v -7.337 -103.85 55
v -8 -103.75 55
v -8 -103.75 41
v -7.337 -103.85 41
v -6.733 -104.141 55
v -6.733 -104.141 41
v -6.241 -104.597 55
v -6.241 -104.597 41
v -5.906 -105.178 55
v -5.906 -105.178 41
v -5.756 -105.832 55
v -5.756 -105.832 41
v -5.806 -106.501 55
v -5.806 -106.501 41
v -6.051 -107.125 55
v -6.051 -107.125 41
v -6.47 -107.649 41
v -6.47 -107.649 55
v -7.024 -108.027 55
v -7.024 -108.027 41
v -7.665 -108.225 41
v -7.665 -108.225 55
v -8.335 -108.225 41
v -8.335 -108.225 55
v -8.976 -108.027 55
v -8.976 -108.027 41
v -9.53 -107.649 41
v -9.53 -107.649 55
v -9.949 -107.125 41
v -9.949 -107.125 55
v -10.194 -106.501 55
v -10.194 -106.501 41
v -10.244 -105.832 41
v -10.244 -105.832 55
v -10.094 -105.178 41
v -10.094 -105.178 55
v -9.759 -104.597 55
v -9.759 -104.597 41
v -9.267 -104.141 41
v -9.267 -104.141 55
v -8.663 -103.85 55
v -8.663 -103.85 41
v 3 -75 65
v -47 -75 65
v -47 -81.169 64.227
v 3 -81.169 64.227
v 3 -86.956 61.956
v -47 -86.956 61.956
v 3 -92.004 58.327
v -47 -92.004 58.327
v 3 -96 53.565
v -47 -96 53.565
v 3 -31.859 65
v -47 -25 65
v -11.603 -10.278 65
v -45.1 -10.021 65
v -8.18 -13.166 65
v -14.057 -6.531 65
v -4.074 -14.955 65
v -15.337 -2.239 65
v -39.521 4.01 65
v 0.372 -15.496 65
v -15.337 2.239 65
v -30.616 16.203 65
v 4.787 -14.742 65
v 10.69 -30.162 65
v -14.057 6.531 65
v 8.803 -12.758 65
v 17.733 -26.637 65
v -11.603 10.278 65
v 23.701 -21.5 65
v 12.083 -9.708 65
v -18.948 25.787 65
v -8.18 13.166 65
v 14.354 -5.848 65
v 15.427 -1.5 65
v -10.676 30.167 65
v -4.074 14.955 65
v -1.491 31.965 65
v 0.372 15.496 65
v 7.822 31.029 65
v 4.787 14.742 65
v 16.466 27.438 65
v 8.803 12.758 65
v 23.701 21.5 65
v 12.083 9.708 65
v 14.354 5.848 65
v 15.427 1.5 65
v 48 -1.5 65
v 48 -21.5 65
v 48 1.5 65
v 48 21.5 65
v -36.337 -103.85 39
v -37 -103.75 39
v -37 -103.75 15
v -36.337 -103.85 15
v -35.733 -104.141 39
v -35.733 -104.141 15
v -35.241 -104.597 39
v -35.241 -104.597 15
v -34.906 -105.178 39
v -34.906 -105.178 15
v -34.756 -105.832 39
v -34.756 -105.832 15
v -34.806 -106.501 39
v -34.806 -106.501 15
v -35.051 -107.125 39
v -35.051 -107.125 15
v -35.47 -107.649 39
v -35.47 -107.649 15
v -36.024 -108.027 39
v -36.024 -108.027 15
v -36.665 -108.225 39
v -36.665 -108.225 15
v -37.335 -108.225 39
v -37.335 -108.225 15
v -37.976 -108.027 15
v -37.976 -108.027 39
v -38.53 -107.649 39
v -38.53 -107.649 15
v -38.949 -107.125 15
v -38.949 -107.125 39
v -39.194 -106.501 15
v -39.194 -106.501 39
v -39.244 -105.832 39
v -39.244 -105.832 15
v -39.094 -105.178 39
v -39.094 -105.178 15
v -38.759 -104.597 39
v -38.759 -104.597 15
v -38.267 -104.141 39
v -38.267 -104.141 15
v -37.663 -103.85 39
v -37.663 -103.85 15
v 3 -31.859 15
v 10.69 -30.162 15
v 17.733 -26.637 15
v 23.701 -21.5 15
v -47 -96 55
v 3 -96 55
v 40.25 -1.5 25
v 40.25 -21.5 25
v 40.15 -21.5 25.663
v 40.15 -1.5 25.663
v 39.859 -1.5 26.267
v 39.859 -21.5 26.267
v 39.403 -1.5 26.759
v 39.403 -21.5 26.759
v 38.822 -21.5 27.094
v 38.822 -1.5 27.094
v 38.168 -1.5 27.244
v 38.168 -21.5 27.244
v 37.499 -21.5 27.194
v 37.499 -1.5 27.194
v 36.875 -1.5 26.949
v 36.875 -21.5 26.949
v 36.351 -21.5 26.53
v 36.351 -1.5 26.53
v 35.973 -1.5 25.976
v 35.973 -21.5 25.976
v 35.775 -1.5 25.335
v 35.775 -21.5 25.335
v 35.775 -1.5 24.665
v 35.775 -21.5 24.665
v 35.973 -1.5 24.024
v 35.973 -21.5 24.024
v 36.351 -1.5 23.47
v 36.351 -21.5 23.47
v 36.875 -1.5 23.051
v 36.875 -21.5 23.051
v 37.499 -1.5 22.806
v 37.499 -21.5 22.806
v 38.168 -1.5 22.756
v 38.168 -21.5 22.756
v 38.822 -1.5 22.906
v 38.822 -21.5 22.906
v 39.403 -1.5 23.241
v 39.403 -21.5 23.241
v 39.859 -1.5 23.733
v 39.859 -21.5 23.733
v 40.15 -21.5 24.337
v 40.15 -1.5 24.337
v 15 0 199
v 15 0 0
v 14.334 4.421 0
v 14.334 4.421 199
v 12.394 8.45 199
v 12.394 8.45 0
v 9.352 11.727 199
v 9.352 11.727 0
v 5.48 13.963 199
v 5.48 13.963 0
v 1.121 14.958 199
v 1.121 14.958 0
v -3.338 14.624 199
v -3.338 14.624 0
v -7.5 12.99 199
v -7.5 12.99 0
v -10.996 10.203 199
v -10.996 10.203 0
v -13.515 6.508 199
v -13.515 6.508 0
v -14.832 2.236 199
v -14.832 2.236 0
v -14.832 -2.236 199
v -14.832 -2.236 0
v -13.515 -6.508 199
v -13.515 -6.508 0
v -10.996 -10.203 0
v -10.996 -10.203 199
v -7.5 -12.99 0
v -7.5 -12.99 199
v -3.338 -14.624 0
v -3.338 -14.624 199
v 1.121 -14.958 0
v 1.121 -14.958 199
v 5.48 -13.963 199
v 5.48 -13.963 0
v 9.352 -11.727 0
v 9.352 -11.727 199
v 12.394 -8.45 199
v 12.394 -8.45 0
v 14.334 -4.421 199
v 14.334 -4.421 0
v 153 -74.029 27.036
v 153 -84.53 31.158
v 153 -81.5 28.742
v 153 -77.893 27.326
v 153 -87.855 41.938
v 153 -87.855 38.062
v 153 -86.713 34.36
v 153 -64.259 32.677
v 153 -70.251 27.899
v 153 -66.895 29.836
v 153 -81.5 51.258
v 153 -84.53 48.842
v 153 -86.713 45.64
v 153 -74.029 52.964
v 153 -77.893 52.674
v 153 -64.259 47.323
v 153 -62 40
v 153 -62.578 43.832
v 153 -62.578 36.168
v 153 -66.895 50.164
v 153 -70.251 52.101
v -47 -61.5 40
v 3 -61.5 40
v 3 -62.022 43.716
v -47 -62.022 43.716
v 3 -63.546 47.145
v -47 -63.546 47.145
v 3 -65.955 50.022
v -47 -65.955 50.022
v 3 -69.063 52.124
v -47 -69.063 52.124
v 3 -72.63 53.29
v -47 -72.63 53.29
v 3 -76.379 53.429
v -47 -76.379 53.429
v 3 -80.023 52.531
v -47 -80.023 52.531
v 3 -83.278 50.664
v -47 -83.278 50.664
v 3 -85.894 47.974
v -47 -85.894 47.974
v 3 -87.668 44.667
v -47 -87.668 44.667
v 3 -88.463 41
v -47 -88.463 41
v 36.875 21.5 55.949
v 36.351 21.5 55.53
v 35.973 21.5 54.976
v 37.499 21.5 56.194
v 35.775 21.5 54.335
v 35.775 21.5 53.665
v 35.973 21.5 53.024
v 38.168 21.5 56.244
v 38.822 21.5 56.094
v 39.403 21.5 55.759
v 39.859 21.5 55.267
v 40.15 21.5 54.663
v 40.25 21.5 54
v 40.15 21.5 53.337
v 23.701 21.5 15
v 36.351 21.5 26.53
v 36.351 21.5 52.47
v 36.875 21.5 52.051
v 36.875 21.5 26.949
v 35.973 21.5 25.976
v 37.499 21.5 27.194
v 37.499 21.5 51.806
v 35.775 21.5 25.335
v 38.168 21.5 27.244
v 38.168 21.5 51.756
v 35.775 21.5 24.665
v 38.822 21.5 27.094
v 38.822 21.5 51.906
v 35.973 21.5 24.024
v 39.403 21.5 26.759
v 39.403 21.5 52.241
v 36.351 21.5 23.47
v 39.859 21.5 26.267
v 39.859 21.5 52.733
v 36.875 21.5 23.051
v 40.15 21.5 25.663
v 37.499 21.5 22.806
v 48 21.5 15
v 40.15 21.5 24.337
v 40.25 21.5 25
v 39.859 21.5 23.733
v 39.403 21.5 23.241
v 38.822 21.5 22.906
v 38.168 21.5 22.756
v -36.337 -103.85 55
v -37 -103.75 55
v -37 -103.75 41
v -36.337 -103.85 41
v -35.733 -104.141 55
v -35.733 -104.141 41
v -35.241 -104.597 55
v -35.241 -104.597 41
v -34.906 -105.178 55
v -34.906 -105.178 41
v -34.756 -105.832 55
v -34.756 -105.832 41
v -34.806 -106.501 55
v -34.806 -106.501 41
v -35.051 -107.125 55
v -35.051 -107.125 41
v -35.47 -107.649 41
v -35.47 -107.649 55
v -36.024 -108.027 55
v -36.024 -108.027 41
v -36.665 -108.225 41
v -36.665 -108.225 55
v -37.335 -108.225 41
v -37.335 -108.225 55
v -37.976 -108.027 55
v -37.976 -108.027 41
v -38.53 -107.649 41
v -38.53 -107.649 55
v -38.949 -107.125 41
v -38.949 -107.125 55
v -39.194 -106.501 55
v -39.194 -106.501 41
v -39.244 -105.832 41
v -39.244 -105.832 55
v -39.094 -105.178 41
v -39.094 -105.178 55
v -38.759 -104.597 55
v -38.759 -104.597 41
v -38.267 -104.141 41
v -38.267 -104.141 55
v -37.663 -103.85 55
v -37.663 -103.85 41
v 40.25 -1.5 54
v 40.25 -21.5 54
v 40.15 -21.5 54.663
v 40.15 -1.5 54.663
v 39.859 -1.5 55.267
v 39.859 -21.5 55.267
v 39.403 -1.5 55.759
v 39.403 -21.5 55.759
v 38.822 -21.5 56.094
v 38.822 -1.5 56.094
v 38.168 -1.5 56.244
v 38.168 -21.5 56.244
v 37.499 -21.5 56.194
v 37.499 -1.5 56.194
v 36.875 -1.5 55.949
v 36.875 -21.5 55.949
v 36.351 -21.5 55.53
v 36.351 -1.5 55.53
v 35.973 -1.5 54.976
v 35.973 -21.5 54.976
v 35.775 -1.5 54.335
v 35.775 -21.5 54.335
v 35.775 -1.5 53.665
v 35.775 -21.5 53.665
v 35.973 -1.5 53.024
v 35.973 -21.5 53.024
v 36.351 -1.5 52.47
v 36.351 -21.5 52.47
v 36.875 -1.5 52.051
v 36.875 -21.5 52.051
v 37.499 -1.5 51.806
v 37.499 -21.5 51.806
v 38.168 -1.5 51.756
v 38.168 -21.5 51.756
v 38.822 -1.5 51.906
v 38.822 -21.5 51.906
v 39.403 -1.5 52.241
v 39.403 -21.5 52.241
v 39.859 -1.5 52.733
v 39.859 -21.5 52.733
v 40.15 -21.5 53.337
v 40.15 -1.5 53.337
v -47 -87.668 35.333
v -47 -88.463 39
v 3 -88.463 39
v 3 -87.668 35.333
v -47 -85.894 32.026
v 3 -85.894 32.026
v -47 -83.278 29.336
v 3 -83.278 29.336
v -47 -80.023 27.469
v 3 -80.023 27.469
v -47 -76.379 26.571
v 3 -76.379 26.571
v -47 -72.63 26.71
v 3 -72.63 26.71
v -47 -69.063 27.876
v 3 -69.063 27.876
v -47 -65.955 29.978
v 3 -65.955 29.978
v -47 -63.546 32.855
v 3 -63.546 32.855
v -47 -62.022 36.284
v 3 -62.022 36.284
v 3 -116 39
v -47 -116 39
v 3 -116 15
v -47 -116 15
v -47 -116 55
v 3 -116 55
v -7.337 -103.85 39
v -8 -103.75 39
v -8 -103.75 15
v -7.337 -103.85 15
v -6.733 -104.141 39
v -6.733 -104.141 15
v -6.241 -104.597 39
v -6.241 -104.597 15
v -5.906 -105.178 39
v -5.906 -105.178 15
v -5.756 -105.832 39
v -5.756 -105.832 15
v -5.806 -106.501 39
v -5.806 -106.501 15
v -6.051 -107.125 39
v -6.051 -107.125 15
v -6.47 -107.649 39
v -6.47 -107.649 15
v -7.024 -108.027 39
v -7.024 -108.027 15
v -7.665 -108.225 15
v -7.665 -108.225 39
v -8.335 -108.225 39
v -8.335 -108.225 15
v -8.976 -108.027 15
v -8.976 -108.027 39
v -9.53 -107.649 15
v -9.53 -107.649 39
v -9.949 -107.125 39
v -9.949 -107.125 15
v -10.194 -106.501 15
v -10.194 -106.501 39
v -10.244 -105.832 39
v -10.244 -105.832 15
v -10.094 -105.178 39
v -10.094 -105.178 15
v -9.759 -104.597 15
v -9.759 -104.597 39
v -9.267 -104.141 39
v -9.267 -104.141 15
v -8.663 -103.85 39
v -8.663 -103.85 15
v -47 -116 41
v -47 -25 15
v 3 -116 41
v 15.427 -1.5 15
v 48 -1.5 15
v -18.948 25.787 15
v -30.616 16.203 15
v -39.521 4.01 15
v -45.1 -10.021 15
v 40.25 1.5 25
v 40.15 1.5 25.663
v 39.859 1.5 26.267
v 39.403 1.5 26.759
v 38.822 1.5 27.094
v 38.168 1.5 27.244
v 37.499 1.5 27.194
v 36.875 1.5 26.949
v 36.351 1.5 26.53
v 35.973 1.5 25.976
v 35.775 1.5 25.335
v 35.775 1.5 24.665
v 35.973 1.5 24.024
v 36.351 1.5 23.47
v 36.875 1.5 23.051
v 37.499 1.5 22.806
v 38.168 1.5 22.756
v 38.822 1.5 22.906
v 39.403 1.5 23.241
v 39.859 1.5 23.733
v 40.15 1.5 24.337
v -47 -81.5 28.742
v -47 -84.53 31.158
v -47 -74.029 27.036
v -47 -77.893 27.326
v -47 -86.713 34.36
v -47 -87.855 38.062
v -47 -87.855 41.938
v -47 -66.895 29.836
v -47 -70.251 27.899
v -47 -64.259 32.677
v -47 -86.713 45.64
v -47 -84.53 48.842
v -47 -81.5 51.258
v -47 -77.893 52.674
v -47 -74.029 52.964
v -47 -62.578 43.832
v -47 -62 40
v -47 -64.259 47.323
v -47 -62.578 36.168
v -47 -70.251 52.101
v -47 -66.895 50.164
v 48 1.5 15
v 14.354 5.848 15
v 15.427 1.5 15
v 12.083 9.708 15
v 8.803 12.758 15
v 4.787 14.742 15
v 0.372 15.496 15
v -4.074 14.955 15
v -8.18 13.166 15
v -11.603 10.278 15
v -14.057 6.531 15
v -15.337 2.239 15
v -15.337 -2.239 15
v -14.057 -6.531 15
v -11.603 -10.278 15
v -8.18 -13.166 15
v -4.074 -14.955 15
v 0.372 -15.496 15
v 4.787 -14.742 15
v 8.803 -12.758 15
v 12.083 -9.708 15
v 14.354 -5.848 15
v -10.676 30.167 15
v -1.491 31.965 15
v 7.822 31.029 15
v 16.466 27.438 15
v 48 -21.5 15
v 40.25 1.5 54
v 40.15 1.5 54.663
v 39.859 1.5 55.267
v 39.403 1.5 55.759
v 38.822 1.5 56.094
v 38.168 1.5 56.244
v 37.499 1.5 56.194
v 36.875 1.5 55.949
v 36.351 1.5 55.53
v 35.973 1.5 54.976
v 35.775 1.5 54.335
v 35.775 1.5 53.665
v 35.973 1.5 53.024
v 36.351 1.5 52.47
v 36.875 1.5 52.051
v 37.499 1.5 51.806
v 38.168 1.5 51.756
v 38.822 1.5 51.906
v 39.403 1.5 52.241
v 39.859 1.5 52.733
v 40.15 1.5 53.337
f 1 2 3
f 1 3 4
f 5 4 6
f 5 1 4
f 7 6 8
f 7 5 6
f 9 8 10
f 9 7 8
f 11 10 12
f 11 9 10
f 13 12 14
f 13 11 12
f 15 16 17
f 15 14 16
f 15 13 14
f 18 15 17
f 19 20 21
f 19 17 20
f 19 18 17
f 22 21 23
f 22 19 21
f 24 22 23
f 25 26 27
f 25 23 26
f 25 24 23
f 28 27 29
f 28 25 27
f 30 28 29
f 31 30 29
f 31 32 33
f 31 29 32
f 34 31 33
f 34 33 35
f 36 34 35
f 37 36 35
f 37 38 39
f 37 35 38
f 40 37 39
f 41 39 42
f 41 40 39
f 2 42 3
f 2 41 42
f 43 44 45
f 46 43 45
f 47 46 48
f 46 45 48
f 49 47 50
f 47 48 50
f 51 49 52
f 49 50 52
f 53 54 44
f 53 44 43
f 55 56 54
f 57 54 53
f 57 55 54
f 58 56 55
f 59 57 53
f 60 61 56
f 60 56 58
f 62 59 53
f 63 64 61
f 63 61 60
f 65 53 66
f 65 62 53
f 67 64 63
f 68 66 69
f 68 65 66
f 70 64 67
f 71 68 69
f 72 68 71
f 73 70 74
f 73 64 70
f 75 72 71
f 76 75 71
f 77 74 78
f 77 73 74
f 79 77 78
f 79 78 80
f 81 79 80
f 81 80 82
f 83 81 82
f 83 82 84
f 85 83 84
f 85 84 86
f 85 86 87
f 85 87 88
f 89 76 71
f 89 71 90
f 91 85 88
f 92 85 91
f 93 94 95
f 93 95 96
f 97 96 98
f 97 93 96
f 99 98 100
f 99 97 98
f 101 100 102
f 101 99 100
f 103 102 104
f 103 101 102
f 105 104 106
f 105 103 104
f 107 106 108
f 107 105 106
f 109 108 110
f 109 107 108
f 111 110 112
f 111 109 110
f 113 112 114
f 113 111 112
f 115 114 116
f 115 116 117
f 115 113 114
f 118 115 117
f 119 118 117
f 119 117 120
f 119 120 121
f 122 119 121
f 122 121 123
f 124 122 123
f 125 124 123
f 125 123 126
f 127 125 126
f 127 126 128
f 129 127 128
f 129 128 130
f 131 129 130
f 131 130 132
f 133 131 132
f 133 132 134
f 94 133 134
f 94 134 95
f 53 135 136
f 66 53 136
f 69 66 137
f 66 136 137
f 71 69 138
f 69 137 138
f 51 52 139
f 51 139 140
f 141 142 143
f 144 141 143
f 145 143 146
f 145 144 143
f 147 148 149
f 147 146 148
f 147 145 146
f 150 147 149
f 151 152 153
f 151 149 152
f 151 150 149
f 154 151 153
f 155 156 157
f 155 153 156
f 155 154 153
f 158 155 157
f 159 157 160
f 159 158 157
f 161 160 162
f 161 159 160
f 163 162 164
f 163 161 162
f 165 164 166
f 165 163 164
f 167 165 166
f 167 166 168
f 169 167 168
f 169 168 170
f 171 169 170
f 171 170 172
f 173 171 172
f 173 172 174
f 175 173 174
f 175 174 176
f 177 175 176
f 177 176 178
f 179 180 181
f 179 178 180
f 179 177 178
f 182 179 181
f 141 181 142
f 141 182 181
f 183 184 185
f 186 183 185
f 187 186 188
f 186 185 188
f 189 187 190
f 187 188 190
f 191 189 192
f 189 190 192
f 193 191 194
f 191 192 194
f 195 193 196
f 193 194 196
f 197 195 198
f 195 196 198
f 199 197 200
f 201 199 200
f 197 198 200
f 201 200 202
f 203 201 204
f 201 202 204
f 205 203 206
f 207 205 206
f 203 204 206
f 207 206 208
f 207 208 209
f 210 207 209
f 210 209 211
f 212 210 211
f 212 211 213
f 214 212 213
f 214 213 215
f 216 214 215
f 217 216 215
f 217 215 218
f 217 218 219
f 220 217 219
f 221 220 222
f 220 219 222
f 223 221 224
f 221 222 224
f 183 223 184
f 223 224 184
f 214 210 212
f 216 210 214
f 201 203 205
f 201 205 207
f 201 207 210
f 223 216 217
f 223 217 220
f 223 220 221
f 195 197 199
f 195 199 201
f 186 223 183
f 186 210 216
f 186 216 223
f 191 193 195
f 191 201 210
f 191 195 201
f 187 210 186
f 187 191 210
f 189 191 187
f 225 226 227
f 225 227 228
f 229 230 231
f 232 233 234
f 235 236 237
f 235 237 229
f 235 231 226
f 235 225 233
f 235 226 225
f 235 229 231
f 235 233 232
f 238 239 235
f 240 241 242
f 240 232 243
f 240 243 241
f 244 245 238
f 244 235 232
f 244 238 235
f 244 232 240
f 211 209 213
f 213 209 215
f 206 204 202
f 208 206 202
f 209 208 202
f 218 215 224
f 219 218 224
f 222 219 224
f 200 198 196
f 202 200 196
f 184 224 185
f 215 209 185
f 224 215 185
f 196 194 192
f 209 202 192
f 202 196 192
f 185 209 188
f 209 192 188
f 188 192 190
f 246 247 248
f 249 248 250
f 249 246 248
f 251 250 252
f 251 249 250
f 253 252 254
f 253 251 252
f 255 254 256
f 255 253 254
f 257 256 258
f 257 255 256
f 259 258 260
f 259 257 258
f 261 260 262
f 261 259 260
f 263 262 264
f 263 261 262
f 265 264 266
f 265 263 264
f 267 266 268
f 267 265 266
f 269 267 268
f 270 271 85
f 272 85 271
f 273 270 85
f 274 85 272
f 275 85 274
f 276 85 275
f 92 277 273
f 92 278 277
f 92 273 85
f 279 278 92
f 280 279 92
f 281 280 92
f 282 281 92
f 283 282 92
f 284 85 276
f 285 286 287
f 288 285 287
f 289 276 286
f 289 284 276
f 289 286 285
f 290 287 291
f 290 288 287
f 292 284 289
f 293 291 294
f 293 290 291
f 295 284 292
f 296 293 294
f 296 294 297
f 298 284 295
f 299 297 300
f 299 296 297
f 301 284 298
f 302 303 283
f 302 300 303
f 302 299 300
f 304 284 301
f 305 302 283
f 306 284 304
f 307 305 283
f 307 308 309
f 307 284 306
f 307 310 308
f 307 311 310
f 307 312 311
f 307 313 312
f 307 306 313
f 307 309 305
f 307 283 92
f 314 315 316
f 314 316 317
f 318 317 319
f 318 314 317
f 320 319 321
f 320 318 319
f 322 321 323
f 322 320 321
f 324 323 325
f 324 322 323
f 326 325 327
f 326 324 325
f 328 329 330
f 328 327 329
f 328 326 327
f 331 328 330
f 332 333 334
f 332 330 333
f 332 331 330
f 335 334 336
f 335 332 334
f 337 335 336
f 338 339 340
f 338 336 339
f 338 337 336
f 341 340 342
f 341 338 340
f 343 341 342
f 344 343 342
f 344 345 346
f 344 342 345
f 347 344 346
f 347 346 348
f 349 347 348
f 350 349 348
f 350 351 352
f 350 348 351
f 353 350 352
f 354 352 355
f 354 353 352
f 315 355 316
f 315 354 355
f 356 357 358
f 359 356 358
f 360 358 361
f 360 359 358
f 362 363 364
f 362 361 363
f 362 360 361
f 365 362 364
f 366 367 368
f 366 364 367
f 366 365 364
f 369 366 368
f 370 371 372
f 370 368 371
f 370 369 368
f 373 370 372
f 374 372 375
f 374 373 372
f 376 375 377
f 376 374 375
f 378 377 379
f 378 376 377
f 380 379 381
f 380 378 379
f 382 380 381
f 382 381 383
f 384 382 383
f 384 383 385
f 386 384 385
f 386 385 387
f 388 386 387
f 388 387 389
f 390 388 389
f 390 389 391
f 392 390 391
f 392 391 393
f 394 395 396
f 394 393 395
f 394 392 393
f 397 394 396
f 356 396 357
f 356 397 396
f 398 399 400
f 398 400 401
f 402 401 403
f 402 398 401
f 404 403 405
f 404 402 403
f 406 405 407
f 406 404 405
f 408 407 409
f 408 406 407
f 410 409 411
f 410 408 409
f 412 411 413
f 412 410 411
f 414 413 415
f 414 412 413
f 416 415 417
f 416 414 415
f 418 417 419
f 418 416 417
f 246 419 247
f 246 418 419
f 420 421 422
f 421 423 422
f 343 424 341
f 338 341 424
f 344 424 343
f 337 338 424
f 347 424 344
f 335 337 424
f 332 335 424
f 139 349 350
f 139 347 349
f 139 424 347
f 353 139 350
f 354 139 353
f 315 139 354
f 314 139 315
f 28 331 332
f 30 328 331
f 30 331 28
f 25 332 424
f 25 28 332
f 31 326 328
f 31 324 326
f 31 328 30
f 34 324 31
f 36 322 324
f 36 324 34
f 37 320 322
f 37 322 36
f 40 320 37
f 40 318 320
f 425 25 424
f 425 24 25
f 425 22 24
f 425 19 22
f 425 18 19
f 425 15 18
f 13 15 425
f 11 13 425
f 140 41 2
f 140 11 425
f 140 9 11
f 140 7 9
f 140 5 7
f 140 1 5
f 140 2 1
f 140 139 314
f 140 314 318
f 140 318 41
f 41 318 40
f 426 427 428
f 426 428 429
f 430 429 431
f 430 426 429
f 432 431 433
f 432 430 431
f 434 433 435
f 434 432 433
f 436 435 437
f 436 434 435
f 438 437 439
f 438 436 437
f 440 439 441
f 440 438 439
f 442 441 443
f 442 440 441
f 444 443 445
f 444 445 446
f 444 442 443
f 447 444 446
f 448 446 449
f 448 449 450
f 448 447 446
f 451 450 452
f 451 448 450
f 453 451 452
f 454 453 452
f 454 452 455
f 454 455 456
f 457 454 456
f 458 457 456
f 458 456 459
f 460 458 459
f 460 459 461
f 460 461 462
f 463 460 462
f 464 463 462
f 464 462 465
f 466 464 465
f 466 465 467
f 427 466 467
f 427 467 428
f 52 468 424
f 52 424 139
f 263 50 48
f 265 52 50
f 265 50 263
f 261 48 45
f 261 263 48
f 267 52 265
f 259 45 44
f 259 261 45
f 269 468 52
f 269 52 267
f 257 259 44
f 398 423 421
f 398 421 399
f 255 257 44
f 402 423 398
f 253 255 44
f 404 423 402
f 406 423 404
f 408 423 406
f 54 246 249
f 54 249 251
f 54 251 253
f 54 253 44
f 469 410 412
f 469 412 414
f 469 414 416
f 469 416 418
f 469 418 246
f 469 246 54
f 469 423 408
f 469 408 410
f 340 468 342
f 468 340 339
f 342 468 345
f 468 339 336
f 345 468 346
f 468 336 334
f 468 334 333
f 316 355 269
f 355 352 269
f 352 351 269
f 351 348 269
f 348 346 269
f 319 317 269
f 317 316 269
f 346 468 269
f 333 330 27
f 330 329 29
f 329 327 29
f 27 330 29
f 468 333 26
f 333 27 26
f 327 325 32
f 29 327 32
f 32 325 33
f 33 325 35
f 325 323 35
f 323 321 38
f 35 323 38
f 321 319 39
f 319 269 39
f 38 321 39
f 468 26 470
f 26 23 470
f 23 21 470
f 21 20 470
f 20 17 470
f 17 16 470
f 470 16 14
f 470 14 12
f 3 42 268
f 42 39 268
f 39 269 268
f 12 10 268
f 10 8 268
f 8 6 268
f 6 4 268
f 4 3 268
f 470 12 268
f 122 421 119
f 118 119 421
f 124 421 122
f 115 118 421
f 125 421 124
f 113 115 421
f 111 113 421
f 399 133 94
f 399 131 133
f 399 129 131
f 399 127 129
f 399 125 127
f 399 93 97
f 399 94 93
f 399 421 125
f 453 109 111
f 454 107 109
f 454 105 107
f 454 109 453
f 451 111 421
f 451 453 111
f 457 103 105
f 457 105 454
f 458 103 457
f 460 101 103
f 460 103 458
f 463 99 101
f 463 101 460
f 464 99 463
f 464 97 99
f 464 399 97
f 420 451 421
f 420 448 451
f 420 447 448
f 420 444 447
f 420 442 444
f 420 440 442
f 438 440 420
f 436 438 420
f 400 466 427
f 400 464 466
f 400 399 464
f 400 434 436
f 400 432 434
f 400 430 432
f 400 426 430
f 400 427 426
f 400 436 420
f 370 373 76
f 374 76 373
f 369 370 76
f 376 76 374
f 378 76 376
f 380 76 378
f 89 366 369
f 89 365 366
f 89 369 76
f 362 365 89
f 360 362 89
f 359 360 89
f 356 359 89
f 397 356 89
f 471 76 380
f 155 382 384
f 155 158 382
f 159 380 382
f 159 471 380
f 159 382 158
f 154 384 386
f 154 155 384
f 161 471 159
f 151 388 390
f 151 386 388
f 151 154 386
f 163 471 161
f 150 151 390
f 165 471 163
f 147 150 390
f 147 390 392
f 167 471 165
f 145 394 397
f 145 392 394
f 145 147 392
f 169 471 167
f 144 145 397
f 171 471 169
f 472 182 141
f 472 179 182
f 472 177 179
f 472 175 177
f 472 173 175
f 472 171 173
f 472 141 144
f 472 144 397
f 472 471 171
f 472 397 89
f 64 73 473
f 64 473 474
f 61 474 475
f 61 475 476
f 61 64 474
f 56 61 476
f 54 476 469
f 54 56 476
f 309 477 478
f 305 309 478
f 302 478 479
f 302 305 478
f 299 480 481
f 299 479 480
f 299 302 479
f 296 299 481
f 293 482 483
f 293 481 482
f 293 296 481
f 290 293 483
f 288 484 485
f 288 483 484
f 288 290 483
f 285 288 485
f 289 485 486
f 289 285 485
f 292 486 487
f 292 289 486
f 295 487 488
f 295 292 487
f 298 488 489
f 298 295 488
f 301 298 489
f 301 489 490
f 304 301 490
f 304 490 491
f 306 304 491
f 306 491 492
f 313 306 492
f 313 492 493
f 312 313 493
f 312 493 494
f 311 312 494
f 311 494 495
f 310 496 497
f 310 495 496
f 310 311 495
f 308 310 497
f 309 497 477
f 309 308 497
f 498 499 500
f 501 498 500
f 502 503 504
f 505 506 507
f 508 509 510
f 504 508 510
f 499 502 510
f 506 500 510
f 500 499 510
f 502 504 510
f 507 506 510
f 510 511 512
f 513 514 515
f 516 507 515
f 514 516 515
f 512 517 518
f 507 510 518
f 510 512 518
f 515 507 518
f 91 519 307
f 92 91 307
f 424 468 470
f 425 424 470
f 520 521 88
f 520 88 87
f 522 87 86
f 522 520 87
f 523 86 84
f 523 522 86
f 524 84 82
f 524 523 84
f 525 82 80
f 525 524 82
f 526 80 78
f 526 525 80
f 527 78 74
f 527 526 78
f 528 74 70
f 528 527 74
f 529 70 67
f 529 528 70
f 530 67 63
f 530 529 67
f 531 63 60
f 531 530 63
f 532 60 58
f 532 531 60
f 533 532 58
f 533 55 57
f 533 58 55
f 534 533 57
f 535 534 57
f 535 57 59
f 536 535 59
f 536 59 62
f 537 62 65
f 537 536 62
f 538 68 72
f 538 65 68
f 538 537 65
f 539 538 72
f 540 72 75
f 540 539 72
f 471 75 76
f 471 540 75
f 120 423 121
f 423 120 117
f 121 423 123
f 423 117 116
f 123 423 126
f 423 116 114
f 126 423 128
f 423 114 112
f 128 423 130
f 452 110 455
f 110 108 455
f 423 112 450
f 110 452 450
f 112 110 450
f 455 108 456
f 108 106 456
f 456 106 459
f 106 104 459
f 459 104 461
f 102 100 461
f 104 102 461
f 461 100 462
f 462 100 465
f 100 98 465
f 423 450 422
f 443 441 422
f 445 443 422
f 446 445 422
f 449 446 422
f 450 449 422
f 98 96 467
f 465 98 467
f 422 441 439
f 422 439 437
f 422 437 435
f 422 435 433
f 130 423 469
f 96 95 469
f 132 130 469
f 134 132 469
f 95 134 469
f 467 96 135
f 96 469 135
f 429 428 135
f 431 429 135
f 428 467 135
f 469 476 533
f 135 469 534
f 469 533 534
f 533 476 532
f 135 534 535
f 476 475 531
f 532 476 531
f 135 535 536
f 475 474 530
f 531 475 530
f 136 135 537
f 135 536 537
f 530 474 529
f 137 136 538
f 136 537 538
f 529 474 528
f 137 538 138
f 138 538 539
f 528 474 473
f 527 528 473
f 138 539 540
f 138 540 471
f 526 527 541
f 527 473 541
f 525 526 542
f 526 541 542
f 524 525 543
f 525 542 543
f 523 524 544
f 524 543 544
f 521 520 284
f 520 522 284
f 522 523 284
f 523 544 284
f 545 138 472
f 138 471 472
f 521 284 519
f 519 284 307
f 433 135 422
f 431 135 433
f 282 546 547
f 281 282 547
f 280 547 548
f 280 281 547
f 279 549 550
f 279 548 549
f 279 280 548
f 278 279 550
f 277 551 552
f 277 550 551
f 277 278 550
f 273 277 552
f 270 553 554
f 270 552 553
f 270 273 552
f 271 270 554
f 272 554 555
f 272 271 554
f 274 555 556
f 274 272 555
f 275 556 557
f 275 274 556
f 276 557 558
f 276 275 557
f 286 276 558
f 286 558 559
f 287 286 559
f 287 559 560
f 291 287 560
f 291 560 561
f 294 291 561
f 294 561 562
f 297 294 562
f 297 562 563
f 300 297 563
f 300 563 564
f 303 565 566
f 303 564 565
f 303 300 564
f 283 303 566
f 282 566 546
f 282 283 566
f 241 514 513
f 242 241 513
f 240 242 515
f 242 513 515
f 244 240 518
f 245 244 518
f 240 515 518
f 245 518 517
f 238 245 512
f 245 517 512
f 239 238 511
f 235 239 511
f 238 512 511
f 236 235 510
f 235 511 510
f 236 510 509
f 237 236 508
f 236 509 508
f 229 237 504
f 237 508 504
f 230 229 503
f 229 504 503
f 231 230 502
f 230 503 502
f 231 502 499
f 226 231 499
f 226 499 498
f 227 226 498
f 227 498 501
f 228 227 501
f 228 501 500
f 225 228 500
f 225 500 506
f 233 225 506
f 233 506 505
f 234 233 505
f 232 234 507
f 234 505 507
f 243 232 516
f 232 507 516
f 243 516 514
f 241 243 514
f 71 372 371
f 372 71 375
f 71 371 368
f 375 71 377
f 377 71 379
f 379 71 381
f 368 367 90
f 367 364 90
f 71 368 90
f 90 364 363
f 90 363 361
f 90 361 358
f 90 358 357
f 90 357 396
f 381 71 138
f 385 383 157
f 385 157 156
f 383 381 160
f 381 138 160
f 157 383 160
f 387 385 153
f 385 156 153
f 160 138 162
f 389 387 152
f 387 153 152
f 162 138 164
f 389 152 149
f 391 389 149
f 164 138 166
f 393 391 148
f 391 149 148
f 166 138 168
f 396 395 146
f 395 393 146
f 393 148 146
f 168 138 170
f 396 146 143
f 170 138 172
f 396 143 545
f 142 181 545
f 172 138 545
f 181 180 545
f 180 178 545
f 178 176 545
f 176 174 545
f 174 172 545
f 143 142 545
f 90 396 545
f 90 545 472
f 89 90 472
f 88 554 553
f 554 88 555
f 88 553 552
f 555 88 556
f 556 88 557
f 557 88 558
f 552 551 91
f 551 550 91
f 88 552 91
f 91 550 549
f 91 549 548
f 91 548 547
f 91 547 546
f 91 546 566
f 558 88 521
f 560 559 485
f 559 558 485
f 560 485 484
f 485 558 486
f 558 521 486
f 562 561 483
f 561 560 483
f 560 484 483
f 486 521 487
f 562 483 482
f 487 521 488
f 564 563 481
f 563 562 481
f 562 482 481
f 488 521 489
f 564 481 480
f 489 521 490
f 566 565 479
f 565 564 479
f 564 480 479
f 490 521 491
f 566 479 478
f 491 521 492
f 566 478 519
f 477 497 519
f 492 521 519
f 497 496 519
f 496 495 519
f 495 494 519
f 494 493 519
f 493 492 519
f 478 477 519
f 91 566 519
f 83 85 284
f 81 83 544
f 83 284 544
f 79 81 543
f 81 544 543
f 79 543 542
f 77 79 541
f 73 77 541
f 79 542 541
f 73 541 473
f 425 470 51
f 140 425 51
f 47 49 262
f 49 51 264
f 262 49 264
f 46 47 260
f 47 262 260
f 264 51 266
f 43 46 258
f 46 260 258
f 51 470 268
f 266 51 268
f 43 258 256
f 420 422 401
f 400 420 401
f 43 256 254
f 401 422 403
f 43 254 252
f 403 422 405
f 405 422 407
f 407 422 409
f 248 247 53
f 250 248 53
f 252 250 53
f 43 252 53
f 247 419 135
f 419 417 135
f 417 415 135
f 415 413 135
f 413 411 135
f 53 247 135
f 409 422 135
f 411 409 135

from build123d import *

# Parameters (mm, degrees)
CYLINDER_R                  = 15
CYLINDER_DEPTH              = 199
CYLINDER001_R               = 13
CYLINDER001_DEPTH           = 200
CYLINDER005_R               = 2.25
CYLINDER005_DEPTH           = 50
CYLINDER006_R               = 2.25
CYLINDER006_DEPTH           = 50
FUSION_ROLL_ANGLE           = 90
FUSION_PLACEMENT_ANGLE      = 90
CYLINDER004_R               = 15.5
CYLINDER004_DEPTH           = 199
CYLINDER003_R               = 13.5
CYLINDER003_DEPTH           = 200
BOX_W                       = 20
BOX_H                       = 3
BOX_DEPTH                   = 50
BOX006_W                    = 50
BOX006_H                    = 27
BOX006_DEPTH                = 2
CYLINDER007_R               = 2.25
CYLINDER007_DEPTH           = 50
CYLINDER008_R               = 2.25
CYLINDER008_DEPTH           = 50
BOX001_W                    = 25
BOX001_H                    = 20
BOX001_DEPTH                = 50
BOX002_W                    = 25
BOX002_H                    = 20
BOX002_DEPTH                = 50
BOX003_W                    = 50
BOX003_H                    = 75
BOX003_DEPTH                = 10
BOX004_W                    = 50
BOX004_H                    = 52
BOX004_DEPTH                = 14
BOX005_W                    = 50
BOX005_H                    = 20
BOX005_DEPTH                = 14
CYLINDER002_W               = 60
CYLINDER002_H               = 50
CYLINDER002_ANGLE           = 60
CYLINDER002_PLACEMENT_ANGLE = 120
TUBE_R                      = 32
TUBE_R_2                    = 15.5
TUBE_DEPTH                  = 50
TUBE001_R                   = 25
TUBE001_R_2                 = 13.5
TUBE001_DEPTH               = 50
BOX007_W                    = 50
BOX007_H                    = 50
BOX007_DEPTH                = 50


with BuildPart() as horizontal:
    # Cylinder → Cylinder (new body)
    with BuildSketch(Plane.XY):
        Circle(CYLINDER_R)
    extrude(amount=CYLINDER_DEPTH)


with BuildPart() as vertical:
    # Cylinder001 → Cylinder001 (new body)
    with BuildSketch(Plane(origin=(-47, -75, 40), x_dir=(0, 1, 0), z_dir=(1, 0, 0))):
        Circle(CYLINDER001_R)
    extrude(amount=CYLINDER001_DEPTH)


with BuildPart() as m4s:
    # Cylinder005 → Cylinder005 (new body)
    with BuildSketch(Plane(origin=(38, 22, 25), x_dir=(1, 0, 0), z_dir=(0, -1, 0))):
        Circle(CYLINDER005_R)
    extrude(amount=CYLINDER005_DEPTH)


with BuildPart() as m4s002:
    # Cylinder006 → Cylinder006 (new body)
    with BuildSketch(Plane(origin=(38, 22, 54), x_dir=(1, 0, 0), z_dir=(0, -1, 0))):
        Circle(CYLINDER006_R)
    extrude(amount=CYLINDER006_DEPTH)

    # Fusion: union m4s
    add(m4s.part)


with BuildPart() as m4s002_1:
    # Fusion roll: moved
    add(m4s002.part.rotate(Axis((0, 0, 0), (1, 0, 0)), FUSION_ROLL_ANGLE))


with BuildPart() as m4s002_2:
    # Fusion placement: moved
    add(m4s002_1.part.moved(Location((-62, -144, 43))).rotate(Axis((-62, -144, 43), (0, 0, 1)), FUSION_PLACEMENT_ANGLE))


with BuildPart() as horizontal001cuts:
    # Cylinder004 → Cylinder004 (new body)
    with BuildSketch(Plane.XY):
        Circle(CYLINDER004_R)
    extrude(amount=CYLINDER004_DEPTH)


with BuildPart() as vertical001cuts:
    # Cylinder003 → Cylinder003 (new body)
    with BuildSketch(Plane(origin=(-47, -75, 40), x_dir=(0, 1, 0), z_dir=(1, 0, 0))):
        Circle(CYLINDER003_R)
    extrude(amount=CYLINDER003_DEPTH)


with BuildPart() as horcuts:
    # Box → Box (new body)
    with BuildSketch(Plane(origin=(14, -1.5, 15), x_dir=(1, 0, 0), z_dir=(0, 0, 1))):
        with Locations((10, 1.5)):
            Rectangle(BOX_W, BOX_H)
    extrude(amount=BOX_DEPTH)


with BuildPart() as vercuts:
    # Box006 → Box006 (new body)
    with BuildSketch(Plane(origin=(-47, -110, 39), x_dir=(1, 0, 0), z_dir=(0, 0, 1))):
        with Locations((25, 13.5)):
            Rectangle(BOX006_W, BOX006_H)
    extrude(amount=BOX006_DEPTH)


with BuildPart() as m4s004:
    # Cylinder007 → Cylinder007 (new body)
    with BuildSketch(Plane(origin=(38, 22, 25), x_dir=(1, 0, 0), z_dir=(0, -1, 0))):
        Circle(CYLINDER007_R)
    extrude(amount=CYLINDER007_DEPTH)


with BuildPart() as cuts:
    # Cylinder008 → Cylinder008 (new body)
    with BuildSketch(Plane(origin=(38, 22, 54), x_dir=(1, 0, 0), z_dir=(0, -1, 0))):
        Circle(CYLINDER008_R)
    extrude(amount=CYLINDER008_DEPTH)

    # Fusion001: union m4s004
    add(m4s004.part)

    # Fusion002: union m4s002, Horizontal001Cuts, Vertical001Cuts, horCuts, verCuts
    add(m4s002_2.part)
    add(horizontal001cuts.part)
    add(vertical001cuts.part)
    add(horcuts.part)
    add(vercuts.part)


with BuildPart() as horadd:
    # Box001 → Box001 (new body)
    with BuildSketch(Plane(origin=(23, -21.5, 15), x_dir=(1, 0, 0), z_dir=(0, 0, 1))):
        with Locations((12.5, 10)):
            Rectangle(BOX001_W, BOX001_H)
    extrude(amount=BOX001_DEPTH)


with BuildPart() as horadd001:
    # Box002 → Box002 (new body)
    with BuildSketch(Plane(origin=(23, 1.5, 15), x_dir=(1, 0, 0), z_dir=(0, 0, 1))):
        with Locations((12.5, 10)):
            Rectangle(BOX002_W, BOX002_H)
    extrude(amount=BOX002_DEPTH)


with BuildPart() as veraddons:
    # Box003 → Box003 (new body)
    with BuildSketch(Plane(origin=(-47, -116, 15), x_dir=(1, 0, 0), z_dir=(0, 0, 1))):
        with Locations((25, 37.5)):
            Rectangle(BOX003_W, BOX003_H)
    extrude(amount=BOX003_DEPTH)


with BuildPart() as veraddons001:
    # Box004 → Box004 (new body)
    with BuildSketch(Plane(origin=(-47, -116, 25), x_dir=(1, 0, 0), z_dir=(0, 0, 1))):
        with Locations((25, 26)):
            Rectangle(BOX004_W, BOX004_H)
    extrude(amount=BOX004_DEPTH)


with BuildPart() as veraddons002:
    # Box005 → Box005 (new body)
    with BuildSketch(Plane(origin=(-47, -116, 41), x_dir=(1, 0, 0), z_dir=(0, 0, 1))):
        with Locations((25, 10)):
            Rectangle(BOX005_W, BOX005_H)
    extrude(amount=BOX005_DEPTH)


with BuildPart() as addcylinder:
    # Cylinder002 → Cylinder002 (revolve)
    with BuildSketch(Plane.XZ):
        with Locations((30, 25)):
            Rectangle(CYLINDER002_W, CYLINDER002_H)
    revolve(axis=Axis((0, 0, 0), (0, 0, 1)), revolution_arc=CYLINDER002_ANGLE)


with BuildPart() as addcylinder_1:
    # Cylinder002 placement: moved
    add(addcylinder.part.moved(Location((13, -25, 15))).rotate(Axis((13, -25, 15), (0, 0, 1)), CYLINDER002_PLACEMENT_ANGLE))


with BuildPart() as tubeaddons:
    # Tube → Tube (new body)
    with BuildSketch(Plane.XY.offset(15)):
        Circle(TUBE_R)
        Circle(TUBE_R_2, mode=Mode.SUBTRACT)
    extrude(amount=TUBE_DEPTH)


with BuildPart() as tubeaddons001:
    # Tube001 → Tube001 (new body)
    with BuildSketch(Plane(origin=(-47, -75, 40), x_dir=(0, 0, -1), z_dir=(1, 0, 0))):
        Circle(TUBE001_R)
        Circle(TUBE001_R_2, mode=Mode.SUBTRACT)
    extrude(amount=TUBE001_DEPTH)


with BuildPart() as rear:
    # Box007 → Box007 (new body)
    with BuildSketch(Plane(origin=(-47, -75, 15), x_dir=(1, 0, 0), z_dir=(0, 0, 1))):
        with Locations((25, 25)):
            Rectangle(BOX007_W, BOX007_H)
    extrude(amount=BOX007_DEPTH)

    # Fusion003: union horAdd, horAdd001, VerAddons, VerAddons001, VerAddons002, AddCylinder, TubeAddons, TubeAddons001
    add(horadd.part)
    add(horadd001.part)
    add(veraddons.part)
    add(veraddons001.part)
    add(veraddons002.part)
    add(addcylinder_1.part)
    add(tubeaddons.part)
    add(tubeaddons001.part)

    # Cut: cut cuts
    add(cuts.part, mode=Mode.SUBTRACT)


solid = Compound([horizontal.part, vertical.part, rear.part])
